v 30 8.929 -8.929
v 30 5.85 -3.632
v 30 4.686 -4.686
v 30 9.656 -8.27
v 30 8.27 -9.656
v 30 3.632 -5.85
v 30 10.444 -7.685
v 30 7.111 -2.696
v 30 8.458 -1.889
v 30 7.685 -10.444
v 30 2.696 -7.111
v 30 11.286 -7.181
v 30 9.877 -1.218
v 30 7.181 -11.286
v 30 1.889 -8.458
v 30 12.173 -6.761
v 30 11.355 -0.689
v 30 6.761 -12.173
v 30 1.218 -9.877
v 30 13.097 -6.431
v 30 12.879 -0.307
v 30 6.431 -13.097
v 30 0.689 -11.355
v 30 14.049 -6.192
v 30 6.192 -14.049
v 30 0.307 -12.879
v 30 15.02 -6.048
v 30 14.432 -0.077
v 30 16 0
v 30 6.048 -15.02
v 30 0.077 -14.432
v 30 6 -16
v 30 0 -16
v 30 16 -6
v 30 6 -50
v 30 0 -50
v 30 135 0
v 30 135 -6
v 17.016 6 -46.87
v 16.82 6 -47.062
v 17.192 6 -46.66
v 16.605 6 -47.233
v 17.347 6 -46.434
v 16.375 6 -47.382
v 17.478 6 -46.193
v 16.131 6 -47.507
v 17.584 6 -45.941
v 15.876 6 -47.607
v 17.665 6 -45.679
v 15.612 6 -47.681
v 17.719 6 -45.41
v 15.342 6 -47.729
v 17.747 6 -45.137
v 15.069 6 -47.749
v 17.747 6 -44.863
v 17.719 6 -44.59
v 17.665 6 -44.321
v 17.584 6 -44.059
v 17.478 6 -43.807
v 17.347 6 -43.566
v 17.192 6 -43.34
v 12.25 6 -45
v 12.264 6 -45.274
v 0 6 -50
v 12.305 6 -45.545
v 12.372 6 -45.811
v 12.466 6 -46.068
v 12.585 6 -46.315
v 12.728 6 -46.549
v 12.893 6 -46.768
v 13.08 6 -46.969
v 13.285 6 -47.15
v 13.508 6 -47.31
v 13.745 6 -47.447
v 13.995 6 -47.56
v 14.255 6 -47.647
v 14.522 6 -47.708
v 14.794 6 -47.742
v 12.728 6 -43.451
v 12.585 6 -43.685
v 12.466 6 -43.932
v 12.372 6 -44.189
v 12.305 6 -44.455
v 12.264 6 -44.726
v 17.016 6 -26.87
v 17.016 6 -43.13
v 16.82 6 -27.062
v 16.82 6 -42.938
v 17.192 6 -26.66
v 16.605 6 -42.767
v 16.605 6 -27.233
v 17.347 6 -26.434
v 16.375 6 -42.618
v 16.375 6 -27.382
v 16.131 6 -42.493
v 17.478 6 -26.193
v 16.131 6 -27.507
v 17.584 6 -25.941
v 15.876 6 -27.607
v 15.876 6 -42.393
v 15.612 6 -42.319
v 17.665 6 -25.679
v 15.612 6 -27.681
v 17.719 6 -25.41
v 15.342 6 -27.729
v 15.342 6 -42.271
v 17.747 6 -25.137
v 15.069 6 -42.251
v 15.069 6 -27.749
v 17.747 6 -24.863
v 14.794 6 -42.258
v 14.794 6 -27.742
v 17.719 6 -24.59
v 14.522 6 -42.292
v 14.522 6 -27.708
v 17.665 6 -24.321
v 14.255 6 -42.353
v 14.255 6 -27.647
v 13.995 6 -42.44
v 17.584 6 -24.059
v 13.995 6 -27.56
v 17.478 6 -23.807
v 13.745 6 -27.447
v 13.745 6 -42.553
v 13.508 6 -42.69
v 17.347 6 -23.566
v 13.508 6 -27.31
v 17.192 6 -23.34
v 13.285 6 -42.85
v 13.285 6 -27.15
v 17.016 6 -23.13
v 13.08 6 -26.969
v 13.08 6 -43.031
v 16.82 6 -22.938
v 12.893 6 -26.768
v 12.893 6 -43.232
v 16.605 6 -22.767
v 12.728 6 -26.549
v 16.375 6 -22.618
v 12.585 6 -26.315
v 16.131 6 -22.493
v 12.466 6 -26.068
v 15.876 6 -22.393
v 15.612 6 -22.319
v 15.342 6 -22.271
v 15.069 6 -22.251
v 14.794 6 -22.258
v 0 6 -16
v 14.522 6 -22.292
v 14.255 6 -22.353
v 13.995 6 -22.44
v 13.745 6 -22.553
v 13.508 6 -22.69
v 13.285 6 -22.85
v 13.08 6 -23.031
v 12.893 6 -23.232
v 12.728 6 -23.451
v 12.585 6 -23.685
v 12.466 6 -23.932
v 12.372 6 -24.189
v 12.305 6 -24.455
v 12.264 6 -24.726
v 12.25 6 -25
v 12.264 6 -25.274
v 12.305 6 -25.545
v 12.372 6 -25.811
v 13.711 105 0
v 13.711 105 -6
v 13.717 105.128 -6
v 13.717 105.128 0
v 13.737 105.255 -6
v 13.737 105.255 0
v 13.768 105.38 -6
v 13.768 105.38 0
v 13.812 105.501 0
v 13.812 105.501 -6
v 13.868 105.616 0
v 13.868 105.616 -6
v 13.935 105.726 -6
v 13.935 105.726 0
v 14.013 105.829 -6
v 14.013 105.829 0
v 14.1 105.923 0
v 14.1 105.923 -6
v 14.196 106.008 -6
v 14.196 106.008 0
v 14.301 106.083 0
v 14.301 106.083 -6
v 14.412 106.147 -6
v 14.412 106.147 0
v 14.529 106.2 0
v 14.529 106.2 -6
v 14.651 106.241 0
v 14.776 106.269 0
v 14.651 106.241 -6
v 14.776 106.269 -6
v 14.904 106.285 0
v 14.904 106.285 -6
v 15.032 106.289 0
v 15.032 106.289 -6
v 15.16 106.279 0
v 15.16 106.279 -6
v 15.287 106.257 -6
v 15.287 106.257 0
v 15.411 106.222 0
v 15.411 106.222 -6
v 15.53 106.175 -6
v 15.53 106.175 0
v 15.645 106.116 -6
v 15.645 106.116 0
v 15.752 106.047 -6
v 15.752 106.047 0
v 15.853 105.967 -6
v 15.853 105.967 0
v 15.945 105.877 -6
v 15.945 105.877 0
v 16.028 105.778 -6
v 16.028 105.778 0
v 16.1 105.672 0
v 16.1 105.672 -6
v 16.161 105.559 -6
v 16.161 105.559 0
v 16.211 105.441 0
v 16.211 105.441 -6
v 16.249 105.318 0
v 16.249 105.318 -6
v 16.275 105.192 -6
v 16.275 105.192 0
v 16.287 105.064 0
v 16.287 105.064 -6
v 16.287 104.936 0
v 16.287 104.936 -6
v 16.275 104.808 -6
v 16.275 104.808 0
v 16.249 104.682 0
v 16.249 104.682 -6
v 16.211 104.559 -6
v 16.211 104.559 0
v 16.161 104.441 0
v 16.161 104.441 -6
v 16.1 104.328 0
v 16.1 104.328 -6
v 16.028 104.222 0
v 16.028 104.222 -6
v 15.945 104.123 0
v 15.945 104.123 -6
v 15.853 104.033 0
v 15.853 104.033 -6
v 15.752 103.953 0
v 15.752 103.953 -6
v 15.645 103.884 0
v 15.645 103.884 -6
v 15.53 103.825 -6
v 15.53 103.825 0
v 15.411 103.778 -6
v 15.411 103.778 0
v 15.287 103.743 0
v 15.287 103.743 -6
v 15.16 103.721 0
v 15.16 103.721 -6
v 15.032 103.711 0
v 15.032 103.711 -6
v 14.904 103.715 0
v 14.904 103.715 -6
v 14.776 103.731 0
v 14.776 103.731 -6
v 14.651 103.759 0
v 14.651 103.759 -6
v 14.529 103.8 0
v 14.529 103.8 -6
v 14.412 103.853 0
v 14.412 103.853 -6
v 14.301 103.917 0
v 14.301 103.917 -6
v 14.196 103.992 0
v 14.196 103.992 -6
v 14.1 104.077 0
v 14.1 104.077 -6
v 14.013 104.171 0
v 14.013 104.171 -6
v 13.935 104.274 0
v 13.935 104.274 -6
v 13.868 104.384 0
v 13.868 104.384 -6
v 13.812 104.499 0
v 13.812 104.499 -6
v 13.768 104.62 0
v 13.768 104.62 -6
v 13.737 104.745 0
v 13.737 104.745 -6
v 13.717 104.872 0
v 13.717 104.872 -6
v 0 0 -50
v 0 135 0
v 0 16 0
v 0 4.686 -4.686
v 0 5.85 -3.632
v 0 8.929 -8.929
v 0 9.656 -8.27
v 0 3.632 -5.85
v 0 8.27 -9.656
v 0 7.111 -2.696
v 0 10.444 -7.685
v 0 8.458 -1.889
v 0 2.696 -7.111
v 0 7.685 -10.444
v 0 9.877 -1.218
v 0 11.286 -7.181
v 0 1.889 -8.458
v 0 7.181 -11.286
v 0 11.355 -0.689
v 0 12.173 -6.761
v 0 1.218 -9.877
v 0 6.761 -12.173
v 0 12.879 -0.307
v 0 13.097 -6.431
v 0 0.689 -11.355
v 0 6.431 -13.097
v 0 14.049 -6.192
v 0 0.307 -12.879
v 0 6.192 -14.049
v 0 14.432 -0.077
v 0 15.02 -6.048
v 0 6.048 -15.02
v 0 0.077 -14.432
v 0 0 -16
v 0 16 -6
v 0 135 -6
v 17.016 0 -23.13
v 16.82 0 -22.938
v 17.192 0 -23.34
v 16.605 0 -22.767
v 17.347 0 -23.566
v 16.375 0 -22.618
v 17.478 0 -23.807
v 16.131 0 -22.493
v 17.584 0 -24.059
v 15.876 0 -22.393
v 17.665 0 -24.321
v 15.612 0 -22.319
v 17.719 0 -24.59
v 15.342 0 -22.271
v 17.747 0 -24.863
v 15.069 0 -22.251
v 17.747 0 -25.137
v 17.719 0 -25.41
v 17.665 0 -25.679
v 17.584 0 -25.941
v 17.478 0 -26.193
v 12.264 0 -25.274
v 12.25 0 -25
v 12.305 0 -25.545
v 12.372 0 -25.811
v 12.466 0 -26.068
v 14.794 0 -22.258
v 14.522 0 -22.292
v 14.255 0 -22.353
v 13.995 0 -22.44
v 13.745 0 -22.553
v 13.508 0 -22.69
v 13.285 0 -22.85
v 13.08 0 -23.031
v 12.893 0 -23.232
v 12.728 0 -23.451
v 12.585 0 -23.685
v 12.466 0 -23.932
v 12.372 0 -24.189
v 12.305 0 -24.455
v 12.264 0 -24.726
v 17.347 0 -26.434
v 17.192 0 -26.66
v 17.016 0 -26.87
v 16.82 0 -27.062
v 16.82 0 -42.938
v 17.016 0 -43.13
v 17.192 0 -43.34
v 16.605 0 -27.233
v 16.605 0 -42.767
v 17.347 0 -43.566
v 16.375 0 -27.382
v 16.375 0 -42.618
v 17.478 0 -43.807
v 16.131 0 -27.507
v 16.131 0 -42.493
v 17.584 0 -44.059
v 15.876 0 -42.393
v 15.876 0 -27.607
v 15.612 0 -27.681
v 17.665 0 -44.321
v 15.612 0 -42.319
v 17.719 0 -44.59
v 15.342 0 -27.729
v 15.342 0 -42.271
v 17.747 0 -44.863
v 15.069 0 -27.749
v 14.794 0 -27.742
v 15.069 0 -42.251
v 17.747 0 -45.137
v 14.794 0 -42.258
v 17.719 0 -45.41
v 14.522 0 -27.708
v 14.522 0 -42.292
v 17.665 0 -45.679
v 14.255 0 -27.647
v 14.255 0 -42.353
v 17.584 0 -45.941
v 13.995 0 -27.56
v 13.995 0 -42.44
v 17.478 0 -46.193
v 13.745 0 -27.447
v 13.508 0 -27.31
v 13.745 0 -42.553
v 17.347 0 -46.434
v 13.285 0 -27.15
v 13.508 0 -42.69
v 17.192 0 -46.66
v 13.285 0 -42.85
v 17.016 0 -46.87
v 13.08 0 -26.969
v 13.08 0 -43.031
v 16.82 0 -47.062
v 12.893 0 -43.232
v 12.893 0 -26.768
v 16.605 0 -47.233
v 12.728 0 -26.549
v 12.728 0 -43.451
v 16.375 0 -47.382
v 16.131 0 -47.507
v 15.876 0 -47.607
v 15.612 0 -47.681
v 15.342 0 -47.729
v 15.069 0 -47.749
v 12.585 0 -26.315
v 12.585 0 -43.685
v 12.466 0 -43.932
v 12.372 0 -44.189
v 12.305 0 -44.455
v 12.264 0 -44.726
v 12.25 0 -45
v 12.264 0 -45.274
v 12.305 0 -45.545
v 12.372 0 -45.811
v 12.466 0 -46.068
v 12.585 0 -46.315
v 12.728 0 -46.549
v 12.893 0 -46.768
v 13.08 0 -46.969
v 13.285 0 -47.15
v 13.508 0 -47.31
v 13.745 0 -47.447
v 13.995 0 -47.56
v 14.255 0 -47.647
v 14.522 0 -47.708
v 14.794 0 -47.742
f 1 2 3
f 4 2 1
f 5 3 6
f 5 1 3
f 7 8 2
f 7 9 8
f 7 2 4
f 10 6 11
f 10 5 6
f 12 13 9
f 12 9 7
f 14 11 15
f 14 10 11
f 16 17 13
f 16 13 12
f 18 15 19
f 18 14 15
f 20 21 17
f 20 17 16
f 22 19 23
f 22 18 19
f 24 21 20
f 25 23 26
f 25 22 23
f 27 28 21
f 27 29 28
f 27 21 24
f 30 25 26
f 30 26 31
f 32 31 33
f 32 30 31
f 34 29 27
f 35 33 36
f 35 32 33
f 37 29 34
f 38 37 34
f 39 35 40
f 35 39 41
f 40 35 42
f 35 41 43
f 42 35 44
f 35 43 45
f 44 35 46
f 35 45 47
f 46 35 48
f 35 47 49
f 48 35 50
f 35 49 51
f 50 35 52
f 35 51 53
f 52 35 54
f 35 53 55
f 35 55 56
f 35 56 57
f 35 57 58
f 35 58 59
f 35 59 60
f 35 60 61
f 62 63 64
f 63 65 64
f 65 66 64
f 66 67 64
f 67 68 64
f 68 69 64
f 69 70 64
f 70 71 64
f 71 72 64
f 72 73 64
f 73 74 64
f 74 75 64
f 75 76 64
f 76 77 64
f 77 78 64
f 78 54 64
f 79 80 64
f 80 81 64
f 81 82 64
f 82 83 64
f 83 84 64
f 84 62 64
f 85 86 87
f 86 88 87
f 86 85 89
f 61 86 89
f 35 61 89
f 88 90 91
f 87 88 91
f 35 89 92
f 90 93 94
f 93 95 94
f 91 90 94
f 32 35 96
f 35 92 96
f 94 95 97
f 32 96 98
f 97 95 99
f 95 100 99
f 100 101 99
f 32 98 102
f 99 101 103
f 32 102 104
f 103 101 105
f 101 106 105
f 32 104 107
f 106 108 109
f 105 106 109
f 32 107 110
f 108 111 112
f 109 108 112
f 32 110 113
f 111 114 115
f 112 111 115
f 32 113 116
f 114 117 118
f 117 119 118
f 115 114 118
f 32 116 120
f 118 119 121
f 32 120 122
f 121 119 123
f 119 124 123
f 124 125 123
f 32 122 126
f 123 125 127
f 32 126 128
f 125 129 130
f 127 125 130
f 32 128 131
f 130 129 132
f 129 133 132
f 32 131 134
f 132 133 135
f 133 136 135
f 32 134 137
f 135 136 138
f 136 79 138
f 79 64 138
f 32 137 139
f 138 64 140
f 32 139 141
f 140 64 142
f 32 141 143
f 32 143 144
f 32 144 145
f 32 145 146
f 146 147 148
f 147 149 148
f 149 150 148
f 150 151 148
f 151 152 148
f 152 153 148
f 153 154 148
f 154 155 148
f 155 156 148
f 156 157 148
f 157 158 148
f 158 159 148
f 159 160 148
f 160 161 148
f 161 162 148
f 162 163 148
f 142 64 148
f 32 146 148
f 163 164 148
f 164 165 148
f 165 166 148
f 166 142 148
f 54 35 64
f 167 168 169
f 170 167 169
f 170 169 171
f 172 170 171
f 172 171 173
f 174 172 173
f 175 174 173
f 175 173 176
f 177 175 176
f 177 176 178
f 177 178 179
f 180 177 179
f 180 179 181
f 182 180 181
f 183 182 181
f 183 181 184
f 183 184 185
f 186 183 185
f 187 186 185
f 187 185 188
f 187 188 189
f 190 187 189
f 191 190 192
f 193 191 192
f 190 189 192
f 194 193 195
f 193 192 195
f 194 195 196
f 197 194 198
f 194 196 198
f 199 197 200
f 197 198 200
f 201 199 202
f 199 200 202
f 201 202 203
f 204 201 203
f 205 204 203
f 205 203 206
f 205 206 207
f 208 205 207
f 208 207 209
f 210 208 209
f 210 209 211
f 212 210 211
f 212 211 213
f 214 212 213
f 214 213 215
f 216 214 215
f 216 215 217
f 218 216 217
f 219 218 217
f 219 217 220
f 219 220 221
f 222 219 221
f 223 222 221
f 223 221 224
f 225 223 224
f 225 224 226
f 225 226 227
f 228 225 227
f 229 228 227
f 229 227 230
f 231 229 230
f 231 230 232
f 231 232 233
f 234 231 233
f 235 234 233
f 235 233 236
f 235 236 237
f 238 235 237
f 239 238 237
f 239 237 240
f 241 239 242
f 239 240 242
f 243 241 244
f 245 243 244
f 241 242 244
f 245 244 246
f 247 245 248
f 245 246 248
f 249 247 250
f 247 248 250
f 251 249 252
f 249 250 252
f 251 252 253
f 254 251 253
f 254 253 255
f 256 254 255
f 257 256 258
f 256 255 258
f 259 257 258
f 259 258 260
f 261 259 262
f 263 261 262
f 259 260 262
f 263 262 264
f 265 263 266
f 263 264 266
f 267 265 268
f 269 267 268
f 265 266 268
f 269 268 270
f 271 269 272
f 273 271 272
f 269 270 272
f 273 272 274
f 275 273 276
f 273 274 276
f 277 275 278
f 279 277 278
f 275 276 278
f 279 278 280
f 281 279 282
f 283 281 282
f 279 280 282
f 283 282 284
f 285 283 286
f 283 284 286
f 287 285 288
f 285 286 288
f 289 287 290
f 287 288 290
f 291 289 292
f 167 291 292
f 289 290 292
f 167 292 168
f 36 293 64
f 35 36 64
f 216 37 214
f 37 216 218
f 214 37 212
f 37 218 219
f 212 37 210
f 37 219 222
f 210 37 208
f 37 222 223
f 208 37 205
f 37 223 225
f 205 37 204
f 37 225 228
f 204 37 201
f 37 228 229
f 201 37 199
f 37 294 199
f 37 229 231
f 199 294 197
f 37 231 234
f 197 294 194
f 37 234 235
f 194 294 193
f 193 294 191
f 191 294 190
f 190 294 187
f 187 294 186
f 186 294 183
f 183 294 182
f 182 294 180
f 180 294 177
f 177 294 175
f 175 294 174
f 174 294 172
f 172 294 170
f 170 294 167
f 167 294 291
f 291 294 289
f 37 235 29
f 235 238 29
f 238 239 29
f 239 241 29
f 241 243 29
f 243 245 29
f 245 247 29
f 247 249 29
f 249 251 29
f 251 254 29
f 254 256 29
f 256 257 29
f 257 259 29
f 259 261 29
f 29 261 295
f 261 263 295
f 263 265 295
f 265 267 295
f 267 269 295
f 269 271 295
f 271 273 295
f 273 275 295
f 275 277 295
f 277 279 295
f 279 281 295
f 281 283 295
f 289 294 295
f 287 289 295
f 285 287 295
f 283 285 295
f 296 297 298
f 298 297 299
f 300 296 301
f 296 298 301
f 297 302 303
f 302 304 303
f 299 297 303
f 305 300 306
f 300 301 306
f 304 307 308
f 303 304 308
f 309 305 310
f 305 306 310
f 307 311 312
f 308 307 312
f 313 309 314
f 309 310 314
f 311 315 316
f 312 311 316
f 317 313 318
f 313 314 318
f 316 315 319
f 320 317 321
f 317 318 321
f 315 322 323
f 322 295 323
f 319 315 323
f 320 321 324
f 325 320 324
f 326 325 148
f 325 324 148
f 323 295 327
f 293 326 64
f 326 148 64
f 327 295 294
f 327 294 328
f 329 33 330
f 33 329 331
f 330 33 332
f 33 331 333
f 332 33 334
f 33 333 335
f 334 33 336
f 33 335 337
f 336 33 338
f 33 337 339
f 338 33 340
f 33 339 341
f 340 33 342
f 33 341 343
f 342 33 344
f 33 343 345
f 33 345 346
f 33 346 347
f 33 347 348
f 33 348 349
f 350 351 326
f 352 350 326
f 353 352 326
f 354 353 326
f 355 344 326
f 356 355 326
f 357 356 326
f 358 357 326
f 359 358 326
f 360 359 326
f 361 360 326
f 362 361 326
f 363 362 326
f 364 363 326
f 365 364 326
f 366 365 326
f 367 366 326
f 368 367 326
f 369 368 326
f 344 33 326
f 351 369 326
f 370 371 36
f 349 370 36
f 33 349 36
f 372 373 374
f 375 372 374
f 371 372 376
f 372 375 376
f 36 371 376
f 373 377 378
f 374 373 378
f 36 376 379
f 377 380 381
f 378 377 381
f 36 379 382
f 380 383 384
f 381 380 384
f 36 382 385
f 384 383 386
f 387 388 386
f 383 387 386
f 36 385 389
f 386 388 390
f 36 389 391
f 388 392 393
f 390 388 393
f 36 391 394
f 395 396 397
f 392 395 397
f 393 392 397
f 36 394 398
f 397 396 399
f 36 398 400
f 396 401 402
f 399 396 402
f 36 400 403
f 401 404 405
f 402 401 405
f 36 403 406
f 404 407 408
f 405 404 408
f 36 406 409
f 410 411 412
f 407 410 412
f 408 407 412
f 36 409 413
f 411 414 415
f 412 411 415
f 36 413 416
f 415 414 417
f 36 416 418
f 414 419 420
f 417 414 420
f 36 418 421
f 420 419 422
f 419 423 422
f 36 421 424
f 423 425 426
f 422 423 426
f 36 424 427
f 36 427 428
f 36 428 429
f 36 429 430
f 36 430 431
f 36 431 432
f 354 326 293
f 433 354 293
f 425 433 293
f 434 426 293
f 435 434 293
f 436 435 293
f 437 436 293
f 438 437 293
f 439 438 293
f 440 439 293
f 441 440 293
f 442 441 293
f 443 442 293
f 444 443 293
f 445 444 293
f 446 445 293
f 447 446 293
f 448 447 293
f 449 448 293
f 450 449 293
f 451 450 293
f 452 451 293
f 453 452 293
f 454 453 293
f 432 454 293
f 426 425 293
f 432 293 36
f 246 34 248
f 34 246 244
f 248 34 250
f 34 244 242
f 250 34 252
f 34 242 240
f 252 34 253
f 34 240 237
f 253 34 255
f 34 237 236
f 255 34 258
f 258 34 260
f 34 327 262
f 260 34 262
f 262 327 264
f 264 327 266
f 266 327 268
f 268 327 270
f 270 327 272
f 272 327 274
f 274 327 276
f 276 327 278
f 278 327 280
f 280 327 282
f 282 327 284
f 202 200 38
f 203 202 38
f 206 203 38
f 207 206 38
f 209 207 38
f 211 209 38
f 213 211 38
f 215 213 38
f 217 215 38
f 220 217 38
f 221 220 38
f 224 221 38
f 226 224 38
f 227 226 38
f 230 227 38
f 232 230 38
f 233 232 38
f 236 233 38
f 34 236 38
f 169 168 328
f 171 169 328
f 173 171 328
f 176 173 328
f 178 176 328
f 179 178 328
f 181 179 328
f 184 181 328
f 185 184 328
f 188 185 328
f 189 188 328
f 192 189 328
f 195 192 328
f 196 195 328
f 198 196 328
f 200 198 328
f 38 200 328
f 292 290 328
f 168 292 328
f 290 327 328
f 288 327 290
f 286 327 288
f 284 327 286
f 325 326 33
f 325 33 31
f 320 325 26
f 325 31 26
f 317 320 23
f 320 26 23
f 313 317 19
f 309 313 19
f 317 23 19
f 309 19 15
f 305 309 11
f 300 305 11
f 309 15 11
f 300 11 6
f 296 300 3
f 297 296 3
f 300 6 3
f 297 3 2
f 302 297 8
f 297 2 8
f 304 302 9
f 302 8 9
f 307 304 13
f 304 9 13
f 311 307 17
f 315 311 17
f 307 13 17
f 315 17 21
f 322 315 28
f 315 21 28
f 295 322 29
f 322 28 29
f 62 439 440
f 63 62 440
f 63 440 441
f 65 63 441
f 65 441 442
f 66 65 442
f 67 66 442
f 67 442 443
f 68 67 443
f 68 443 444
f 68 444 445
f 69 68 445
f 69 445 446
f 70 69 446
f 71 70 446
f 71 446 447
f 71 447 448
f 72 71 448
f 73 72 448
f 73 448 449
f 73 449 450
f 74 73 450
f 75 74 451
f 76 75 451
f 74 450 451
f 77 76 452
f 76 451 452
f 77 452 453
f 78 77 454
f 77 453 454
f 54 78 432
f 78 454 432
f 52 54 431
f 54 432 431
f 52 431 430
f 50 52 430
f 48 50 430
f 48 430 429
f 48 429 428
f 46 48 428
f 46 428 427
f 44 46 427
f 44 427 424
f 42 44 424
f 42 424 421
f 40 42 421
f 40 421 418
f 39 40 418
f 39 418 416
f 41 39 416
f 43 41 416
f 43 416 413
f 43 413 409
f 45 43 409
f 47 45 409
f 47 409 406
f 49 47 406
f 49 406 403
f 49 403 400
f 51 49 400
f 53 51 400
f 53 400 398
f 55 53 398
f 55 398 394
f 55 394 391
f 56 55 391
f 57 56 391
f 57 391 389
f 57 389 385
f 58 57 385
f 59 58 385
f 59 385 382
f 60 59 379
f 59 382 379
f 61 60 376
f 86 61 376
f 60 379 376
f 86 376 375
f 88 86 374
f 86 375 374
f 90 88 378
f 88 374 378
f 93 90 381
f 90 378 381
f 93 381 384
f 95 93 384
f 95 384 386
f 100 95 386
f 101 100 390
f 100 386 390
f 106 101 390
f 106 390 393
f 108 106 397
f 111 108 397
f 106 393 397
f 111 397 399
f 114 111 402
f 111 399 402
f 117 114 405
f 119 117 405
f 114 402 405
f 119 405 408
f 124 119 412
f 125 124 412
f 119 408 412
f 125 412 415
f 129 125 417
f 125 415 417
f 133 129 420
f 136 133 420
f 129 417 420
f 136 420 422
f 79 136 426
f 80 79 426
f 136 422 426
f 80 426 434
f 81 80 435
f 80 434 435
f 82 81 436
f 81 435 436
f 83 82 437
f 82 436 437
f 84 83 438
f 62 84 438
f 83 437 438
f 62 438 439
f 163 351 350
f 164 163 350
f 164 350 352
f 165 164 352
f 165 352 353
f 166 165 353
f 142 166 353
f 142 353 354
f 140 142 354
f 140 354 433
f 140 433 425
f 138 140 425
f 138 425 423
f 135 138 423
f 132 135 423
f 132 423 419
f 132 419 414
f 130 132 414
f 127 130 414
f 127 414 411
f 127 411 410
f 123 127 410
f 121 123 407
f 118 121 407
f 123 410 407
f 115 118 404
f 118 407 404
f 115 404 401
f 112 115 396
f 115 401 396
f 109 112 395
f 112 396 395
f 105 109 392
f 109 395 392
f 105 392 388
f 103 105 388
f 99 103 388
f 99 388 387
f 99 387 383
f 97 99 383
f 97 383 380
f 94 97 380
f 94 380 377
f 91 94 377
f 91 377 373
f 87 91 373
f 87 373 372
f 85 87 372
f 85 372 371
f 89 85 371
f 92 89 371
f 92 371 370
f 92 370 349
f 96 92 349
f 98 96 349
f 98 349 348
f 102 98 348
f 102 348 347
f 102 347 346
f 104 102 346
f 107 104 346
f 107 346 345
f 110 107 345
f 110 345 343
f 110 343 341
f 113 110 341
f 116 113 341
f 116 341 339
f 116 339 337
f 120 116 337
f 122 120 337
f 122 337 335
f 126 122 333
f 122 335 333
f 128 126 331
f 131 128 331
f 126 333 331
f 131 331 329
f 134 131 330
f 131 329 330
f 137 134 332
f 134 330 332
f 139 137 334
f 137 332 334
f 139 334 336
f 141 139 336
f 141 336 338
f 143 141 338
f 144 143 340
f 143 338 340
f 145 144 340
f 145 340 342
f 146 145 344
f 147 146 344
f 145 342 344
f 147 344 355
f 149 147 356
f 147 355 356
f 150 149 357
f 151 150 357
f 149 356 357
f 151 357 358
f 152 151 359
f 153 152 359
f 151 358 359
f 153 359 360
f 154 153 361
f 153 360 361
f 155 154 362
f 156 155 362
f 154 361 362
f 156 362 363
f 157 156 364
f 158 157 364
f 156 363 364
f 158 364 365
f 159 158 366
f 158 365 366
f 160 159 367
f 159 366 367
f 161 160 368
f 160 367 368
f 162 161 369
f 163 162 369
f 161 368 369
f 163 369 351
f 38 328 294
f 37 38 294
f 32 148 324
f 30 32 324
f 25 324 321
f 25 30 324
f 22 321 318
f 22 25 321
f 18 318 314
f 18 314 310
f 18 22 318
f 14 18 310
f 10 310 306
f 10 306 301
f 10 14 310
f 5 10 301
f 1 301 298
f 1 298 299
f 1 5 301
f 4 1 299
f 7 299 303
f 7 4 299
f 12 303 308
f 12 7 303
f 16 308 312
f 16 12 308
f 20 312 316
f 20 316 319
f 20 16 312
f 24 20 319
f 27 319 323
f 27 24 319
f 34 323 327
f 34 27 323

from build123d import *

# Parameters (mm, degrees)
BOSS_EXTRUDE1_DEPTH   = 30
FILLET1_R             = 10
FILLET2_R             = 16
M5_CLEARANCE_HOLE1_D  = 5.5
F_5_40_TAPPED_HOLE1_D = 2.5781


with BuildPart() as part:
    # Sketch1 → Boss-Extrude1 (new body)
    with BuildSketch(Plane(origin=(0, 0, 0), x_dir=(0, 0, -1), z_dir=(1, 0, 0))):
        Polygon((0, 0), (50, 0), (50, 6), (6, 6), (6, 135), (0, 135), align=None)
    extrude(amount=BOSS_EXTRUDE1_DEPTH)

    # Fillet1
    fillet1_edges = [part.edges().sort_by_distance(p)[0] for p in [
        (15, 6, -6),
    ]]
    fillet(fillet1_edges, radius=FILLET1_R)

    # Fillet2
    fillet2_edges = [part.edges().sort_by_distance(p)[0] for p in [
        (15, 0, 0),
    ]]
    fillet(fillet2_edges, radius=FILLET2_R)

    # M5 Clearance Hole1 (through all)
    with Locations(Plane(origin=(0, 6, 0), x_dir=(1, 0, 0), z_dir=(0, 1, 0))):
        with Locations((15, 45), (15, 25)):
            Hole(M5_CLEARANCE_HOLE1_D / 2)

    # #5-40 Tapped Hole1 (through all)
    with Locations(Plane.XY):
        with Locations((15, 105)):
            Hole(F_5_40_TAPPED_HOLE1_D / 2)


solid = part.part
